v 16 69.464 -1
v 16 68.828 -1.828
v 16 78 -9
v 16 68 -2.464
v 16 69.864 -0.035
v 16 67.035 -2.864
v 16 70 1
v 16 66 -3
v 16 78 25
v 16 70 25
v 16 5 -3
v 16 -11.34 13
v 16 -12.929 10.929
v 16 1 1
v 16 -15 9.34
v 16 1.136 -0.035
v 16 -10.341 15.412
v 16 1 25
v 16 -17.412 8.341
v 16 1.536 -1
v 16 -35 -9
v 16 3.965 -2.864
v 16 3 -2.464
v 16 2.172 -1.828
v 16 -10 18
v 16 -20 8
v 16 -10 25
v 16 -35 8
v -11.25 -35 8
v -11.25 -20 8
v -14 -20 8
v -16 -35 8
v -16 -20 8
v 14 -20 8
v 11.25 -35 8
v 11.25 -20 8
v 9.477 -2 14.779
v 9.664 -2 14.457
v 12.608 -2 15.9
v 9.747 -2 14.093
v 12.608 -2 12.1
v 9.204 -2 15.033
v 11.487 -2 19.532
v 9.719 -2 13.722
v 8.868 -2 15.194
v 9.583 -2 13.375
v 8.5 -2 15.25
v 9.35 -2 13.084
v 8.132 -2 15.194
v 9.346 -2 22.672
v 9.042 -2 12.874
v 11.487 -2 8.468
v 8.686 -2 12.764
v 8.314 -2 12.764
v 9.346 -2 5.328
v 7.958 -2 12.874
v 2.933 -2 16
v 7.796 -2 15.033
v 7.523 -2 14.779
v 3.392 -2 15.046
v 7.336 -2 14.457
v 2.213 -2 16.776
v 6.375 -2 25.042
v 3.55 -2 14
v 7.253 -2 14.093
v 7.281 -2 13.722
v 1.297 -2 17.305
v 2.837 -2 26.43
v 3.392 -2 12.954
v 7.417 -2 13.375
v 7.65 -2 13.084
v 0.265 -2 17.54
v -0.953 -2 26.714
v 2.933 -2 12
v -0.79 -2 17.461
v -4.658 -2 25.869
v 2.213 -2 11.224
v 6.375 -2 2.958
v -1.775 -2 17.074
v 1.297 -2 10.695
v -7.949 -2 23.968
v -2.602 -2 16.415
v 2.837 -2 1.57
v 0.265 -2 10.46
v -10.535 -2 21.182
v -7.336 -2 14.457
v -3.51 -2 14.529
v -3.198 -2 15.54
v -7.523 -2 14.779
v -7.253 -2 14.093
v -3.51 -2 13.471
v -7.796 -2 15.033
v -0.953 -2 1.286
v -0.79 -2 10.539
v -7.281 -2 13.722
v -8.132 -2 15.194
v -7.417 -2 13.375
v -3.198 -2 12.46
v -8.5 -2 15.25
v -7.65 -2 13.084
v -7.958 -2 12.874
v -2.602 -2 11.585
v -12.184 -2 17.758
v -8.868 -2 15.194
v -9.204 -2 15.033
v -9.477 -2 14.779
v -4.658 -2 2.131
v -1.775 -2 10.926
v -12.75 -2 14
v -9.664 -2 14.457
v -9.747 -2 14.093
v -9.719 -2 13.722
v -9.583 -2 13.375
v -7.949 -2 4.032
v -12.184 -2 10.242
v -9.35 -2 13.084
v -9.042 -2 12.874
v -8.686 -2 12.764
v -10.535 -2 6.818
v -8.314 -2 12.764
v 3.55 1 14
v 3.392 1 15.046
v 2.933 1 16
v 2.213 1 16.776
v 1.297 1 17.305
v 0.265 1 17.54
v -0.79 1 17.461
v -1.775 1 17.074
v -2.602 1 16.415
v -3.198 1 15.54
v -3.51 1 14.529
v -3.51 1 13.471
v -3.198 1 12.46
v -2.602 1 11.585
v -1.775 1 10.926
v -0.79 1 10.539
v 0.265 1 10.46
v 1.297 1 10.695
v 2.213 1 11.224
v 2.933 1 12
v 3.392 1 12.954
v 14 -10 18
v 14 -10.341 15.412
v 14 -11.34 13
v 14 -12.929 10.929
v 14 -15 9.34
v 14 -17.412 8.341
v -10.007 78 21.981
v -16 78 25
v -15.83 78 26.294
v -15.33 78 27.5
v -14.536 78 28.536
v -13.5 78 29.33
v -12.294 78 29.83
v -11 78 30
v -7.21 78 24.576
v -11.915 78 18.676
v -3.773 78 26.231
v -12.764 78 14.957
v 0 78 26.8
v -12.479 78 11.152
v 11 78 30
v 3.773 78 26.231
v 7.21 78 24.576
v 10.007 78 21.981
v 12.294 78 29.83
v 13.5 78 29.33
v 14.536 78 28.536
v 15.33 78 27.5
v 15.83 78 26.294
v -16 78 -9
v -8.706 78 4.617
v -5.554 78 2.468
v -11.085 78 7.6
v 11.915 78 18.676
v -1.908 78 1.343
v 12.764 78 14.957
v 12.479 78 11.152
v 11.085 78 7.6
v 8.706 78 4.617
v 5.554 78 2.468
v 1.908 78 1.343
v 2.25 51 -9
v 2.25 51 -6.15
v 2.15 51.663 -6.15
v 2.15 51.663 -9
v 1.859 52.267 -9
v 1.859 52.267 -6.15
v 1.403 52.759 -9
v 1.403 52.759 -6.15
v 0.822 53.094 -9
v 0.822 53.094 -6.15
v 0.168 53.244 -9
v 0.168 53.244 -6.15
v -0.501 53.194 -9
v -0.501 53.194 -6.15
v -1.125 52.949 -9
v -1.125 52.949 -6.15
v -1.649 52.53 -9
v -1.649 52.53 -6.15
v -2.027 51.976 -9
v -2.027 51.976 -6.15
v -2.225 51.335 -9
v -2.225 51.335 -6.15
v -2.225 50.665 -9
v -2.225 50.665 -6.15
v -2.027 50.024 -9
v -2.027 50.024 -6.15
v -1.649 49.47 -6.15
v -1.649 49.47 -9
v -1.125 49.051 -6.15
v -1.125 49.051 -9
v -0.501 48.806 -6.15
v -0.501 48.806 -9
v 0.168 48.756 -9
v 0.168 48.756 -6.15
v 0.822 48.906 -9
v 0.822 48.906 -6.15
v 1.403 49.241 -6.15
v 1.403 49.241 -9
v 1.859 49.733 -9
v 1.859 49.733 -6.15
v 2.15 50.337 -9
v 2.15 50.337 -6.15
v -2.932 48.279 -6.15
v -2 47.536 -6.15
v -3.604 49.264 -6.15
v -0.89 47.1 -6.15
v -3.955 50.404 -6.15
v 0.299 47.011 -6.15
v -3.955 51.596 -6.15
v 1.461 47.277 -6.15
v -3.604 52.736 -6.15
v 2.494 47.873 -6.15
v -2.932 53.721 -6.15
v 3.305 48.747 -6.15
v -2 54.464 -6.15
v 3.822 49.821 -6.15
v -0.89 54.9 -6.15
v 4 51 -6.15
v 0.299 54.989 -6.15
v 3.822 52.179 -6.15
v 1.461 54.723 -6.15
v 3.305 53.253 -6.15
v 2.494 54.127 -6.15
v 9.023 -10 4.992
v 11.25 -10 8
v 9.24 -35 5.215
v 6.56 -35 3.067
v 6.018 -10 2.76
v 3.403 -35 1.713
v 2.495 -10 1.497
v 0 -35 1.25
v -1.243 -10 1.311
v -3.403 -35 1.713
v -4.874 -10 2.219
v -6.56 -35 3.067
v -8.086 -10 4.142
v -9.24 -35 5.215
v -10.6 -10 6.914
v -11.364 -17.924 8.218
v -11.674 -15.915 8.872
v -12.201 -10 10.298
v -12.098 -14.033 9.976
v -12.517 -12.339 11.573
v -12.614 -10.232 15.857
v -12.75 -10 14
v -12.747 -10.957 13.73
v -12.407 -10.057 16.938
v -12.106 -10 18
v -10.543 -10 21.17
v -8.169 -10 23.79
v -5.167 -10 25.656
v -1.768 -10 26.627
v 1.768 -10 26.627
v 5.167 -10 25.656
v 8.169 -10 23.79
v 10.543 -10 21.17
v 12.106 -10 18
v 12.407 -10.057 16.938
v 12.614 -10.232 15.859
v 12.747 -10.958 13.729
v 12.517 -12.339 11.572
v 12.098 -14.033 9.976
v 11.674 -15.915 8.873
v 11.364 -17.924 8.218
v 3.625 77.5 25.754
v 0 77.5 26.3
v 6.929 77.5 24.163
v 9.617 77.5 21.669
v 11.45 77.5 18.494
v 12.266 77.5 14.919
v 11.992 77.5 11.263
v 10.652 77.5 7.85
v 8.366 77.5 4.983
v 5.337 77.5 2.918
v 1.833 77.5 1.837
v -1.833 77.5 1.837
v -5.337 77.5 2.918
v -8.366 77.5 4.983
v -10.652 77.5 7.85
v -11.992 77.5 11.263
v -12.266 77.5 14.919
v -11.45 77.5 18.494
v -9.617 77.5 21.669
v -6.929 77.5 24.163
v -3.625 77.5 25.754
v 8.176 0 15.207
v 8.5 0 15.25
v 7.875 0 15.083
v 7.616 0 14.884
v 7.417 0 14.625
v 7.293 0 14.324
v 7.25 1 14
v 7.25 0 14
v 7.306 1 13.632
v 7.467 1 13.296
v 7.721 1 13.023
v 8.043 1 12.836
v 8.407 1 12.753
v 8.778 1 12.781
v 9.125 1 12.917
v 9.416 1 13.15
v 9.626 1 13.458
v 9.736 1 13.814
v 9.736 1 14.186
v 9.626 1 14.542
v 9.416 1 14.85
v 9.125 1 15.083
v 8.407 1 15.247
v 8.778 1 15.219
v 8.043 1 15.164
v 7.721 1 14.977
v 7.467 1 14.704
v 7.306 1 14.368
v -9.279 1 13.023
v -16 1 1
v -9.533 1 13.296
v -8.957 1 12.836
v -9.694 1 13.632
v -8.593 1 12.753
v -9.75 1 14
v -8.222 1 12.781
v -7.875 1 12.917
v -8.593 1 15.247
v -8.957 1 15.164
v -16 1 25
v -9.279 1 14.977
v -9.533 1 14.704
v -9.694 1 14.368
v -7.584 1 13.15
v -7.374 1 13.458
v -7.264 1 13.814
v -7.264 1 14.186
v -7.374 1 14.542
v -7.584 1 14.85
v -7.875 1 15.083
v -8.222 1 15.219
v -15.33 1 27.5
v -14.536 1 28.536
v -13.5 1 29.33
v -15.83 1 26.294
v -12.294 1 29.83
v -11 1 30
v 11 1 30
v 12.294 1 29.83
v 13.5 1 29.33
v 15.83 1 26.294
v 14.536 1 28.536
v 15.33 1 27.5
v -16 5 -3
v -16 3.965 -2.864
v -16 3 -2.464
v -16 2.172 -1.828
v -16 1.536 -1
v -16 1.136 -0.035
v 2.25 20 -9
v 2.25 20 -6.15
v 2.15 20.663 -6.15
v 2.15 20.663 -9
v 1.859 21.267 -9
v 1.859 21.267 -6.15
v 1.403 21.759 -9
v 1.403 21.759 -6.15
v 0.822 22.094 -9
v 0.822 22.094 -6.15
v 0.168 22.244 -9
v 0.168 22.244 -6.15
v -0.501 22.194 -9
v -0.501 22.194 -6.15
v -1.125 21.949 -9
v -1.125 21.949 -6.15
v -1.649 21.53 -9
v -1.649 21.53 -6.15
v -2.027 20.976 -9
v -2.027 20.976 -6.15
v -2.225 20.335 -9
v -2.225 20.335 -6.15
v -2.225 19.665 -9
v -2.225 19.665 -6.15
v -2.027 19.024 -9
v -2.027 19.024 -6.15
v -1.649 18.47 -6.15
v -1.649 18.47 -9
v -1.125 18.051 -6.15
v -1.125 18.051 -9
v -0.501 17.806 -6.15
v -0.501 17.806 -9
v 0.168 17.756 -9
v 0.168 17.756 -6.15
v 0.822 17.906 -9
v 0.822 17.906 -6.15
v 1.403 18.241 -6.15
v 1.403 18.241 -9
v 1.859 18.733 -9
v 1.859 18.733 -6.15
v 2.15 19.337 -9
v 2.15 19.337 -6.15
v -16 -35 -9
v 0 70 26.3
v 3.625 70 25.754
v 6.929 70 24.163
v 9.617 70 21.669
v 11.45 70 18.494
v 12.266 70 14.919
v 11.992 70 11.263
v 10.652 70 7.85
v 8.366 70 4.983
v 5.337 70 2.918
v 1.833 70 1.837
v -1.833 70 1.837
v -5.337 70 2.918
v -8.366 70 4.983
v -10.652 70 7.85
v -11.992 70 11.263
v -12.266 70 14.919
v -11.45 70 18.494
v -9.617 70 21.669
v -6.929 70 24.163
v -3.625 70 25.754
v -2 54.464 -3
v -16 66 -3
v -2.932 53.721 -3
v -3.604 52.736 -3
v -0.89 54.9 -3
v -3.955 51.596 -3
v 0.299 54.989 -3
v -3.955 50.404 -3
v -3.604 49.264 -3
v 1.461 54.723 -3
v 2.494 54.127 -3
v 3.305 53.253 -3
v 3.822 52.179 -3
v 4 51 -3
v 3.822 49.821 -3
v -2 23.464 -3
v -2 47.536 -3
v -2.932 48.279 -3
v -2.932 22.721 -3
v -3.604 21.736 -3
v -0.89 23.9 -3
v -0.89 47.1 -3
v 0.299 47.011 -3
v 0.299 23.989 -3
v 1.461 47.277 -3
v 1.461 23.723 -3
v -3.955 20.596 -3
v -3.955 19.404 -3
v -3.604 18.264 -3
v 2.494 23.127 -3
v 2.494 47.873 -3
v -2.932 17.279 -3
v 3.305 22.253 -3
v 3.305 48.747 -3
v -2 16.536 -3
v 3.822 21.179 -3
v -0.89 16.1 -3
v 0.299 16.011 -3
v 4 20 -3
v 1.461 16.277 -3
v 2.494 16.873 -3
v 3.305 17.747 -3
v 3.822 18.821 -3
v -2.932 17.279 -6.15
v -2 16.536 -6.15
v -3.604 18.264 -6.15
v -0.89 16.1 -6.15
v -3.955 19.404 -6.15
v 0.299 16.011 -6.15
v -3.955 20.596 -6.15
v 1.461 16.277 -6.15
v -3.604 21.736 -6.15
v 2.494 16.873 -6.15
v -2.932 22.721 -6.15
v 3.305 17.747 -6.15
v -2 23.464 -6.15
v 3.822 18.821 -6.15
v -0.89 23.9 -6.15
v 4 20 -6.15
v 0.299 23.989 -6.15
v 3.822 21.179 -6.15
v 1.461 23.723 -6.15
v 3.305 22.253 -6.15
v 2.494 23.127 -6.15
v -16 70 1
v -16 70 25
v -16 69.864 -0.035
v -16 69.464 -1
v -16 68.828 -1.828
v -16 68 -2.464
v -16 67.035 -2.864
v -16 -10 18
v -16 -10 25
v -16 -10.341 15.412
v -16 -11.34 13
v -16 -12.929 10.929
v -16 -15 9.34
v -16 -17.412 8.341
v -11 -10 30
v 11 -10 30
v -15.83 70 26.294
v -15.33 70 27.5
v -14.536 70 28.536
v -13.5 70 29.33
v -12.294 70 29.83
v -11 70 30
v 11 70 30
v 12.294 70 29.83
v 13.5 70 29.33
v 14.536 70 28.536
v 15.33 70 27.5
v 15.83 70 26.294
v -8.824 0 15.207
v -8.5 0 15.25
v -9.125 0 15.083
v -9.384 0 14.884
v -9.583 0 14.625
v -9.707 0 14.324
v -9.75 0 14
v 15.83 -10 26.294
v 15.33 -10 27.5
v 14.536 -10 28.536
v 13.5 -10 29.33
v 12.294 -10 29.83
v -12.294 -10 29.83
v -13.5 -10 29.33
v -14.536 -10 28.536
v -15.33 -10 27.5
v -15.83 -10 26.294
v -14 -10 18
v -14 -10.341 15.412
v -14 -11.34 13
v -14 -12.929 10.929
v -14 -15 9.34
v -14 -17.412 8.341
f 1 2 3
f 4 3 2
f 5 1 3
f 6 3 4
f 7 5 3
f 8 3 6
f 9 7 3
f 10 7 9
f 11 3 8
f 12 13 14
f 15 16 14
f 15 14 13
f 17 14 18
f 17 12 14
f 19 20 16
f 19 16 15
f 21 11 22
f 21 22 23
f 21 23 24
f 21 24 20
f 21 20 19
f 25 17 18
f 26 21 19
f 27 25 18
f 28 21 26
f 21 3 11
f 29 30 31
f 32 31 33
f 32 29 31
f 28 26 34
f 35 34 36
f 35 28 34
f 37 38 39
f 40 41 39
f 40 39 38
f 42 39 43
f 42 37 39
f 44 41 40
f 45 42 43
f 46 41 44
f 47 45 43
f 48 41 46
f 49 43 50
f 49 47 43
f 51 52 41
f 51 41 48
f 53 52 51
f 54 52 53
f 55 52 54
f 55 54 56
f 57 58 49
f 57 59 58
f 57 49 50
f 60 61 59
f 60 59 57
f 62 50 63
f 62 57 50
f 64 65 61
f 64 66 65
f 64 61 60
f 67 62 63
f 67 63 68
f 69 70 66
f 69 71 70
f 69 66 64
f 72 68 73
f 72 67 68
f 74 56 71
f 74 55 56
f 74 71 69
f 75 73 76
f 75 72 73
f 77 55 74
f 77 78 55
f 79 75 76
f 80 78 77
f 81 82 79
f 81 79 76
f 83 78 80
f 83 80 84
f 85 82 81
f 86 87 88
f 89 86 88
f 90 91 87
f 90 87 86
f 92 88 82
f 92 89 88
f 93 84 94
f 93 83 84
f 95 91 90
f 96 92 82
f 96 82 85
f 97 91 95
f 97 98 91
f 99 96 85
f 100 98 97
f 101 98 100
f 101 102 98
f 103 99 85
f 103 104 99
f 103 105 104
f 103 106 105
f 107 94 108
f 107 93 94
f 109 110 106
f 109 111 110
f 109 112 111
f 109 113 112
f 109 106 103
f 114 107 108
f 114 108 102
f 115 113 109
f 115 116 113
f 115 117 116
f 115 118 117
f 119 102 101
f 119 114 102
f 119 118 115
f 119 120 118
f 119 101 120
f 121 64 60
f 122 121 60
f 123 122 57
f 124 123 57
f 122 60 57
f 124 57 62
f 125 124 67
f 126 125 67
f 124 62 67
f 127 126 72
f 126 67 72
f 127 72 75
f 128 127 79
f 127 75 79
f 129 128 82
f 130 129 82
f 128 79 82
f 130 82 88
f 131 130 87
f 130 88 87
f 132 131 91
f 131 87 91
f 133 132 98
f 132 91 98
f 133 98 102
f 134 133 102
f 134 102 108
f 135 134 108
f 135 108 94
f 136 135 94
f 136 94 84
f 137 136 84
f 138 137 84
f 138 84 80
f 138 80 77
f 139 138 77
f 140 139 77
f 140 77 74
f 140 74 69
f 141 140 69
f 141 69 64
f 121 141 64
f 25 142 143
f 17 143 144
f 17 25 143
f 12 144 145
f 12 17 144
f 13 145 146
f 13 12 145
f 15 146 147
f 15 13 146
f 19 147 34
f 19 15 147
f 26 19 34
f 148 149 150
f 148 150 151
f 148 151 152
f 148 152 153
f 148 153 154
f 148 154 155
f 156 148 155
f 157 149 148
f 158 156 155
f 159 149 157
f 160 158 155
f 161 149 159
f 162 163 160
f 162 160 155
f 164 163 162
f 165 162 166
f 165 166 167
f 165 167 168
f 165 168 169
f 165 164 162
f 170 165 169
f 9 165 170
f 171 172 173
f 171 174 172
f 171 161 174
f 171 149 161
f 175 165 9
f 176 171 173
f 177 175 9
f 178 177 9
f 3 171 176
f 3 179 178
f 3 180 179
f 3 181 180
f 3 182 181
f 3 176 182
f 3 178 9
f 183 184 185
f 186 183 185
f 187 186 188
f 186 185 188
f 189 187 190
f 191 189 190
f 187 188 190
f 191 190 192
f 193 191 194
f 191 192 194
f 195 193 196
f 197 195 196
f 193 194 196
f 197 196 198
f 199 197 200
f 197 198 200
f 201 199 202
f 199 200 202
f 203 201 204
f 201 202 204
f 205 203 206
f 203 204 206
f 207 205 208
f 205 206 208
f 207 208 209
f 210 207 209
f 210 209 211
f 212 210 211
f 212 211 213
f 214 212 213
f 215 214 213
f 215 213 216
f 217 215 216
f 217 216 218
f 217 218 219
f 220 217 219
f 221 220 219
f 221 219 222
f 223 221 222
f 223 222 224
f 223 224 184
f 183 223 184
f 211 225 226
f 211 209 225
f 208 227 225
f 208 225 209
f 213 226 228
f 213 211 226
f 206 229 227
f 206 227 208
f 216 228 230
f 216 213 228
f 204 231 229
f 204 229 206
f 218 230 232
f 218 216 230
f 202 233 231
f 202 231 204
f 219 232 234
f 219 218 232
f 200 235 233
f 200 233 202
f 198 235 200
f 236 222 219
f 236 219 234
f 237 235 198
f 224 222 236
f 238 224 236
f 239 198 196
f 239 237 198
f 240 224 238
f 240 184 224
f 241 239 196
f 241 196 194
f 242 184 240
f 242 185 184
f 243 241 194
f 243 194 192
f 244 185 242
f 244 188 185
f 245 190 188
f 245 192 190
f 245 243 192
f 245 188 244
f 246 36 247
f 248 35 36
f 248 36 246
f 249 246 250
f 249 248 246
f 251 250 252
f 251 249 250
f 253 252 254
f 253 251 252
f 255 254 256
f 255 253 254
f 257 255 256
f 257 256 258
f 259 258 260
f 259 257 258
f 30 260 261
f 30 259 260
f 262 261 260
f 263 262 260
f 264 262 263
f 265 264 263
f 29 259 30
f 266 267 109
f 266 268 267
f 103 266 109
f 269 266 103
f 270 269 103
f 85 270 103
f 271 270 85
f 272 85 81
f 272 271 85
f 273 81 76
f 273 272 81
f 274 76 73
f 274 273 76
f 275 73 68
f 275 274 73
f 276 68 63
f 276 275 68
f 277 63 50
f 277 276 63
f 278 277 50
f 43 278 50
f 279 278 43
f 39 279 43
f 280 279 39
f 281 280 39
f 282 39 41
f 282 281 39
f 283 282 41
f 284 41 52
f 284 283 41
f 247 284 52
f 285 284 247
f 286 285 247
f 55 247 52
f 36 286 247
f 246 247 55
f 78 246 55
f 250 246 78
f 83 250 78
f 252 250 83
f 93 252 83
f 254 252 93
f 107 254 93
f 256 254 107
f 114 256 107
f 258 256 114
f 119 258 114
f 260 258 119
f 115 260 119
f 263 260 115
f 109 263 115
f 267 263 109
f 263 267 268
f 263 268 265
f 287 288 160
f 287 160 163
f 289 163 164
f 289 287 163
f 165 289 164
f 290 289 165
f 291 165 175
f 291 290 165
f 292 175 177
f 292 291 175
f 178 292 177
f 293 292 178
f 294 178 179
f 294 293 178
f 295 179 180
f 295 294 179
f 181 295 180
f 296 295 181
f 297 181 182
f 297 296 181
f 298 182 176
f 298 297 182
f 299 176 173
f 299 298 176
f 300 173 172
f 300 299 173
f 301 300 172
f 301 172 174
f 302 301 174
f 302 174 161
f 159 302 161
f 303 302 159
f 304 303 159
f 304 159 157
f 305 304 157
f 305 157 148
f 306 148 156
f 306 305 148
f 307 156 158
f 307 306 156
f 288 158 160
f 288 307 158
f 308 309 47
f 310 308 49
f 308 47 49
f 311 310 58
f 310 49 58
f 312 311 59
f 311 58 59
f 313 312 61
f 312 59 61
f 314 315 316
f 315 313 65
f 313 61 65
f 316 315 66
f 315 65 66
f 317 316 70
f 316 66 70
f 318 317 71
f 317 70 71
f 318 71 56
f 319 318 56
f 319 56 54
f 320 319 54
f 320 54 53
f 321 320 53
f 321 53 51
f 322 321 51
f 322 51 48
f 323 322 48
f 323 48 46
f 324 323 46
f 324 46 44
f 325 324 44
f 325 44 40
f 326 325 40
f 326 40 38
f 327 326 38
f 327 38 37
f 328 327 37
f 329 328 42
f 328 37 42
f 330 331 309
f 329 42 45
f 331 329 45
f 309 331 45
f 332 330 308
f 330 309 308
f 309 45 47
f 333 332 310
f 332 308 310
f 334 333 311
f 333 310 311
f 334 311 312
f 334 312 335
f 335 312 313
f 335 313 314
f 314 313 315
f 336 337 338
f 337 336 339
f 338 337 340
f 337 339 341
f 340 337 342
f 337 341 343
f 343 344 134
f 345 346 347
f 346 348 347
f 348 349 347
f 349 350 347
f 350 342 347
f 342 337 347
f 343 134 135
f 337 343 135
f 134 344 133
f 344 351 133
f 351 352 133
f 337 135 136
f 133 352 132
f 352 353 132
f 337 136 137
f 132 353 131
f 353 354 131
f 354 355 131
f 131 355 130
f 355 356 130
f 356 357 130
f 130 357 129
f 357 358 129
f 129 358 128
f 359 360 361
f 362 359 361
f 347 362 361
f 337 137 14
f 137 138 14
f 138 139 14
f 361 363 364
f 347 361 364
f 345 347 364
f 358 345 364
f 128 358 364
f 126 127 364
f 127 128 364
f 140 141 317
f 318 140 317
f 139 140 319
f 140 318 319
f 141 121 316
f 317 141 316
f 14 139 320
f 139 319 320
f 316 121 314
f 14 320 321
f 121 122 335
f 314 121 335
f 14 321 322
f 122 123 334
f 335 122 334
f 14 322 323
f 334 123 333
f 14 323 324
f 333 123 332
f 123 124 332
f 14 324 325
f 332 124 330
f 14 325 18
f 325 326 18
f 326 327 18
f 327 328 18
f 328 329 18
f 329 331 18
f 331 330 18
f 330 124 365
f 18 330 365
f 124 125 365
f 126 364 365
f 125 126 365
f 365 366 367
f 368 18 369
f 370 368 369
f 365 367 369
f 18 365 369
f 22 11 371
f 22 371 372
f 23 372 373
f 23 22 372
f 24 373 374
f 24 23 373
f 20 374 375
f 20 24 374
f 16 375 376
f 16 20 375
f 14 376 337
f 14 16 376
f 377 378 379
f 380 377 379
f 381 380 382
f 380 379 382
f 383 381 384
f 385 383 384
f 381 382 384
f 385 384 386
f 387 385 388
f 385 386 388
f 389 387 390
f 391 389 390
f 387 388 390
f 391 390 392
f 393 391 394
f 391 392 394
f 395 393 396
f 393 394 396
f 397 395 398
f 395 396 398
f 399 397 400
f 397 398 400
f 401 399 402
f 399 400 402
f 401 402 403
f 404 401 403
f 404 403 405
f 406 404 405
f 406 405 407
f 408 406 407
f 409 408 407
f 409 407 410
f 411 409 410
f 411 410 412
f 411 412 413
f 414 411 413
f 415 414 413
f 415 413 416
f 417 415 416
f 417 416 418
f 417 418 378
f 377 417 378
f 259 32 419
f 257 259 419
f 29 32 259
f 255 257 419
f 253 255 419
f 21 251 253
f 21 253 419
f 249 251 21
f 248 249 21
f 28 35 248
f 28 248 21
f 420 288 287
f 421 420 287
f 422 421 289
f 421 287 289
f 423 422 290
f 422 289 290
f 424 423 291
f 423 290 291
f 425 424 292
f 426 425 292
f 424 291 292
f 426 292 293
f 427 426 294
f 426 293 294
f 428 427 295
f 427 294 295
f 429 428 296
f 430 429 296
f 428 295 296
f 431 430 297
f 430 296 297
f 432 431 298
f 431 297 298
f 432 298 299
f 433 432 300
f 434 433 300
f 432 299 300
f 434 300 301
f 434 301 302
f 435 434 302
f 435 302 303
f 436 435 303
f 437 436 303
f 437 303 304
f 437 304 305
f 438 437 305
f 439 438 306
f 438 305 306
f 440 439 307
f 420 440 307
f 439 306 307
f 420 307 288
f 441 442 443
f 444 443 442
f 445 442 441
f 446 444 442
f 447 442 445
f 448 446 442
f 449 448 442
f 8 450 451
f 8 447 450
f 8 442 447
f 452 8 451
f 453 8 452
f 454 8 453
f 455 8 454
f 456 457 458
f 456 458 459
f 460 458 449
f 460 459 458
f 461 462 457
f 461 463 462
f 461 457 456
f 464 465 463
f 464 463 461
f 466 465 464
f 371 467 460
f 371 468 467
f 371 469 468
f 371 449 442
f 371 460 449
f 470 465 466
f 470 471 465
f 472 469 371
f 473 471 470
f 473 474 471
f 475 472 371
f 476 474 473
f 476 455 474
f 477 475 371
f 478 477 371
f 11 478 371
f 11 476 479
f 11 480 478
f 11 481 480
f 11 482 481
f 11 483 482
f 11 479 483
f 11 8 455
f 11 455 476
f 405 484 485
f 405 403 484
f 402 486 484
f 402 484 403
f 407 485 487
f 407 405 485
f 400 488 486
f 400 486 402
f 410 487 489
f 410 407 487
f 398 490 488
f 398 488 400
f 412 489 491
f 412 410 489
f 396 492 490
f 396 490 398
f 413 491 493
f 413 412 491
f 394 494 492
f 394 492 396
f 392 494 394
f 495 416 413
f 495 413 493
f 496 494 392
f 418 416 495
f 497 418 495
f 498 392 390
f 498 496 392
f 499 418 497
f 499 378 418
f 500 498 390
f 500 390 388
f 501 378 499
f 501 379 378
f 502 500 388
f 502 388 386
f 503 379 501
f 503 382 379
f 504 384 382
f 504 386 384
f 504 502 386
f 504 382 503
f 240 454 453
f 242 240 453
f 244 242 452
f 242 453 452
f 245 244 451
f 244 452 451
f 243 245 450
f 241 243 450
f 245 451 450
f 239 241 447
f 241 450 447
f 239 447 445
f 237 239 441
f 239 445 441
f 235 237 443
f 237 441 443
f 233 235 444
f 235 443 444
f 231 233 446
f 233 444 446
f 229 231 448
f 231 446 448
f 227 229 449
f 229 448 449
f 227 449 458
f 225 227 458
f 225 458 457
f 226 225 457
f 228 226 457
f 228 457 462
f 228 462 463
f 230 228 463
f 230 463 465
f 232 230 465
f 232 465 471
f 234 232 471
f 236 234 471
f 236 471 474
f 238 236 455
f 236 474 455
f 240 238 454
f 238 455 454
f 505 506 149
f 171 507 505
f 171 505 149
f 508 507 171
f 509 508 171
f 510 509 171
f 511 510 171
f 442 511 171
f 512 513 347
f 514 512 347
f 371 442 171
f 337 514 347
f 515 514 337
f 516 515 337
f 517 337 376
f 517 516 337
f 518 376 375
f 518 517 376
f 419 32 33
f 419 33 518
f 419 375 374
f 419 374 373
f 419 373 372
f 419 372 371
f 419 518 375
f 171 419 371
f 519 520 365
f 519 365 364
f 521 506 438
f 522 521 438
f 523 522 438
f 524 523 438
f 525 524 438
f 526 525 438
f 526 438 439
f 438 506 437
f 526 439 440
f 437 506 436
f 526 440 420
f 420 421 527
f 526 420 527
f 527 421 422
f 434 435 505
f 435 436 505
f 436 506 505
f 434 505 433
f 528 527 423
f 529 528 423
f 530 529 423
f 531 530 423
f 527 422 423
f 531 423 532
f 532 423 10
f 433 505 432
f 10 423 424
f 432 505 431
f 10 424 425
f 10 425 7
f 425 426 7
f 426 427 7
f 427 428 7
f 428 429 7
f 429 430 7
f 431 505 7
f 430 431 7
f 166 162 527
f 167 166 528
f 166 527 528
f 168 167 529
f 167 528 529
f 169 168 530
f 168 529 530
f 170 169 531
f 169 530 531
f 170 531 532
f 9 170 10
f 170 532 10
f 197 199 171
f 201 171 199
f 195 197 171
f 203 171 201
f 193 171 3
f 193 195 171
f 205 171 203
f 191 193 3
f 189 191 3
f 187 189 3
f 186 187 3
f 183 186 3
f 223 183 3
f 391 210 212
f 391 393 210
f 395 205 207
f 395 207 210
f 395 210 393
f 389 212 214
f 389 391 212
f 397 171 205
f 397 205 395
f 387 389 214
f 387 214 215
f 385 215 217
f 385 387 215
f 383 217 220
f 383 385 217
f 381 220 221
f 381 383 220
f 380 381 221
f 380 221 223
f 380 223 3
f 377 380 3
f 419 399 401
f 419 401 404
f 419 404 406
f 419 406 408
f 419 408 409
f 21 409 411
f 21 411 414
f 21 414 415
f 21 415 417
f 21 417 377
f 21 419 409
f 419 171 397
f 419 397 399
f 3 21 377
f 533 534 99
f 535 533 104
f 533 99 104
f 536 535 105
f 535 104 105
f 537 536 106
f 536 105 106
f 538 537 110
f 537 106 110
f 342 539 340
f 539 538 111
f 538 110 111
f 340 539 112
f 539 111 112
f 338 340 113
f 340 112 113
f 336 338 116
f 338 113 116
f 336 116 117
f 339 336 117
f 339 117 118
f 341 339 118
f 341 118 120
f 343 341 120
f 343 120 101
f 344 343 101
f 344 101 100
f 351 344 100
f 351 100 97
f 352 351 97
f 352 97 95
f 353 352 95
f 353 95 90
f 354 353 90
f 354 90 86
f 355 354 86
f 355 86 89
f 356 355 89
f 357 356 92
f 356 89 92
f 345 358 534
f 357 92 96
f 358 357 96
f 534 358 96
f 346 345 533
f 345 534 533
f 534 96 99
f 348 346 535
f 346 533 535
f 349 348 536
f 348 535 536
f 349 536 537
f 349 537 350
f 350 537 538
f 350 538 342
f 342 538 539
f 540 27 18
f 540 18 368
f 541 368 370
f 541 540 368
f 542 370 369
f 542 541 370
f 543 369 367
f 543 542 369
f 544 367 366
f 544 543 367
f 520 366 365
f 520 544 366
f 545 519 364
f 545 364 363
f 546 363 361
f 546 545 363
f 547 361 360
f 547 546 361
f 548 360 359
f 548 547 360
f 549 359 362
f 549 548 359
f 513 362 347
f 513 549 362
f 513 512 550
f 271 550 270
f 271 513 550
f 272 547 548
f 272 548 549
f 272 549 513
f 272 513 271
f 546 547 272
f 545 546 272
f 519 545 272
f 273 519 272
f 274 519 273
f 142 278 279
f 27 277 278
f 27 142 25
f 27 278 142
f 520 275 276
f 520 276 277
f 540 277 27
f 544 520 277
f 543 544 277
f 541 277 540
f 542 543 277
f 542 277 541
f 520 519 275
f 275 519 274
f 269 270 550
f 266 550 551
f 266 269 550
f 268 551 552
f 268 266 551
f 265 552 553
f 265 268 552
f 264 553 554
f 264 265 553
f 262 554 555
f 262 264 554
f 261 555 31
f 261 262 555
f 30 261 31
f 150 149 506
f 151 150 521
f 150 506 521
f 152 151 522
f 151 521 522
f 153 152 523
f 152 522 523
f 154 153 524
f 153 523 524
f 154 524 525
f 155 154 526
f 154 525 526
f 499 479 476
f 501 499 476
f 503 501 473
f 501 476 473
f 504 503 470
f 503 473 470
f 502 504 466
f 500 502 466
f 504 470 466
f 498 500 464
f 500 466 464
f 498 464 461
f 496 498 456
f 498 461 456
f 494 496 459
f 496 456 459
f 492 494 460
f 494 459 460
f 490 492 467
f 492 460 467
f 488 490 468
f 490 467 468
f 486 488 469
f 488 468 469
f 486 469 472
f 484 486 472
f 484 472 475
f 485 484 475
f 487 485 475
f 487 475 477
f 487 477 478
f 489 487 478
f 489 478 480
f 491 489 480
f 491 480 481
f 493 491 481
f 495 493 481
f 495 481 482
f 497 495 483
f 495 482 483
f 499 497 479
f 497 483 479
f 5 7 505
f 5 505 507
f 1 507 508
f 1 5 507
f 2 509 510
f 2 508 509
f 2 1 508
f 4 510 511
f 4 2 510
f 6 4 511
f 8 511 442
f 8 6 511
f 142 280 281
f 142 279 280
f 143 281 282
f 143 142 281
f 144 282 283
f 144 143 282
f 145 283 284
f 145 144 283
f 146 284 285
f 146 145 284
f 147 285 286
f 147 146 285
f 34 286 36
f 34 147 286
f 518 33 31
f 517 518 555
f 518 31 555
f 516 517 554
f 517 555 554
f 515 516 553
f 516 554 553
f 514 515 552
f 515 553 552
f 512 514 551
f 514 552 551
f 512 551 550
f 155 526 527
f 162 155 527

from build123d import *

# Parameters (mm, degrees)
CROQUIS1_W                          = 31
CROQUIS1_H                          = 72
SALIENTE_EXTRUIR1_DEPTH             = 28
CROQUIS2_W                          = 27
CROQUIS2_H                          = 69
CORTAR_EXTRUIR1_DEPTH               = 83.170554337
CROQUIS5_W                          = 13
CROQUIS5_H                          = 10
DI_METRO_DE_TALADRO_2_5_2_5_2_D     = 2.5
DI_METRO_DE_TALADRO_2_5_2_5_2_DEPTH = 11
REDONDEO3_R                         = 5
REDONDEO4_R                         = 3
SALIENTE_EXTRUIR2_START             = 10
CROQUIS14_R                         = 13
SALIENTE_EXTRUIR2_DEPTH             = 10
CROQUIS15_W                         = 28
CROQUIS15_H                         = 82
SALIENTE_EXTRUIR3_DEPTH             = 6
CORTAR_EXTRUIR2_REACH               = 80.511
CROQUIS16_R                         = 3.55
CROQUIS17_R                         = 3.55
SALIENTE_EXTRUIR4_DEPTH             = 6
CORTAR_EXTRUIR3_DEPTH               = 88.475710915
SALIENTE_EXTRUIR5_START             = 10
SALIENTE_EXTRUIR5_DEPTH             = 10
REDONDEO5_R                         = 10
CROQUIS20_R                         = 2.25
CORTAR_EXTRUIR4_DEPTH               = 86.094065614
CROQUIS21_R                         = 4
CROQUIS21_R_2                       = 2.25
CORTAR_EXTRUIR5_DEPTH               = 3.15
SALIENTE_EXTRUIR6_START             = 2
CROQUIS22_R                         = 12.75
CROQUIS22_R_2                       = 1.25
CROQUIS22_R_3                       = 3.55
SALIENTE_EXTRUIR6_DEPTH             = 2
SALIENTE_EXTRUIR7_START             = -8
SALIENTE_EXTRUIR7_DEPTH             = 8
SALIENTE_EXTRUIR8_DEPTH             = 2
SALIENTE_EXTRUIR9_START             = 2
SALIENTE_EXTRUIR9_DEPTH             = 2
SALIENTE_EXTRUIR10_DEPTH            = 11
CROQUIS27_R                         = 12.3
CORTAR_EXTRUIR6_DEPTH               = 8
SALIENTE_EXTRUIR11_START            = 15
SALIENTE_EXTRUIR11_DEPTH            = 15
CHAFL_N1_SIZE                       = 0.5


with BuildPart() as part:
    # Croquis1 → Saliente-Extruir1 (new body)
    with BuildSketch(Plane(origin=(14, 0, 0), x_dir=(0, 0, -1), z_dir=(1, 0, 0))):
        with Locations((-12.5, 36)):
            Rectangle(CROQUIS1_W, CROQUIS1_H)
    extrude(amount=-SALIENTE_EXTRUIR1_DEPTH)

    # Croquis2 → Cortar-Extruir1 (cut, through all)
    with BuildSketch(Plane.ZY.offset(14)):
        with Locations((14.5, 35.5)):
            Rectangle(CROQUIS2_W, CROQUIS2_H)
    extrude(amount=-CORTAR_EXTRUIR1_DEPTH, mode=Mode.SUBTRACT)

    # Croquis5 → Revolución3 (revolve)
    with BuildSketch(Plane(origin=(0, 0, 14), x_dir=(-1, 0, 0), z_dir=(0, 0, -1)), mode=Mode.PRIVATE) as revoluci_n3_sk:
        with Locations((-6.5, -5)):
            Rectangle(CROQUIS5_W, CROQUIS5_H)
    revolve(revoluci_n3_sk.sketch.rotate(Axis((0, -10, 14), (0, 1, 0)), 180), axis=Axis((0, -10, 14), (0, 1, 0)))

    # Croquis6 → Cortar-Revolución1 (revolve, cut)
    with BuildSketch(Plane(origin=(0, 0, 14), x_dir=(-1, 0, 0), z_dir=(0, 0, -1)), mode=Mode.PRIVATE) as cortar_revoluci_n1_sk:
        Polygon((-12.75, -10), (0, -10), (0, 2), (-2.3, 2), (-2.3, 1), (-2.25, 1), (-2.25, 0), (-12.75, 0), align=None)
    revolve(cortar_revoluci_n1_sk.sketch.rotate(Axis((0, -10, 14), (0, 1, 0)), 180), axis=Axis((0, -10, 14), (0, 1, 0)), mode=Mode.SUBTRACT)

    # Diámetro de taladro Ø2.5 (2.5)2
    with Locations(Plane(origin=(0, 1, 0), x_dir=(1, 0, 0), z_dir=(0, 1, 0))):
        with Locations((8.5, -14), (-8.5, -14)):
            Hole(DI_METRO_DE_TALADRO_2_5_2_5_2_D / 2, depth=DI_METRO_DE_TALADRO_2_5_2_5_2_DEPTH)

    # Redondeo3
    redondeo3_edges = [part.edges().sort_by_distance(p)[0] for p in [
        (0, 1, 1),
        (0, 70, 1),
    ]]
    fillet(redondeo3_edges, radius=REDONDEO3_R)

    # Redondeo4
    redondeo4_edges = [part.edges().sort_by_distance(p)[0] for p in [
        (14, 0.5, 28),
        (-14, 0.5, 28),
        (14, 71, 28),
        (-14, 71, 28),
    ]]
    fillet(redondeo4_edges, radius=REDONDEO4_R)

    # Croquis14 → Saliente-Extruir2 (add)
    with BuildSketch(Plane.XZ.offset(SALIENTE_EXTRUIR2_START)):
        with BuildLine():
            Line((11, 28), (-11, 28))
            ThreePointArc((-11, 28), (-13.121320344, 27.121320344), (-14, 25))
            Line((-14, 25), (-14, -3))
            Line((-14, -3), (14, -3))
            Line((14, -3), (14, 25))
            ThreePointArc((14, 25), (13.121320344, 27.121320344), (11, 28))
        make_face()
        with Locations((0, 14)):
            Circle(CROQUIS14_R, mode=Mode.SUBTRACT)
    extrude(amount=-SALIENTE_EXTRUIR2_DEPTH)

    # Croquis15 → Saliente-Extruir3 (add)
    with BuildSketch(Plane(origin=(0, 0, -3), x_dir=(-1, 0, 0), z_dir=(0, 0, -1))):
        with Locations((0, 31)):
            Rectangle(CROQUIS15_W, CROQUIS15_H)
    extrude(amount=SALIENTE_EXTRUIR3_DEPTH)

    # Cortar-Extruir2: up to this face of the body (flat: up to its plane)
    cortar_extruir2_end = Plane(part.part.faces().sort_by_distance((0, 72, 9.433270582))[0])
    # Croquis16 → Cortar-Extruir2 (cut, up to the picked face)
    with BuildSketch(Plane.XZ, mode=Mode.PRIVATE) as cortar_extruir2_sk1:
        with Locations((0, 14)):
            Circle(CROQUIS16_R)
    cortar_extruir2_tool1 = split(extrude(cortar_extruir2_sk1.sketch, amount=-CORTAR_EXTRUIR2_REACH, mode=Mode.PRIVATE), bisect_by=cortar_extruir2_end, keep=Keep.BOTH, mode=Mode.PRIVATE)
    add(cortar_extruir2_tool1.solids().sort_by(Axis((0, 0, 14), (0, 1, 0)))[0], mode=Mode.SUBTRACT)

    # Croquis17 → Saliente-Extruir4 (add)
    with BuildSketch(Plane(origin=(0, 72, 0), x_dir=(1, 0, 0), z_dir=(0, 1, 0))):
        with BuildLine():
            Line((-11, -28), (11, -28))
            ThreePointArc((11, -28), (13.121320344, -27.121320344), (14, -25))
            Line((14, -25), (14, 9))
            Line((14, 9), (-14, 9))
            Line((-14, 9), (-14, -25))
            ThreePointArc((-14, -25), (-13.121320344, -27.121320344), (-11, -28))
        make_face()
        with Locations((0, -14)):
            Circle(CROQUIS17_R, mode=Mode.SUBTRACT)
    extrude(amount=SALIENTE_EXTRUIR4_DEPTH)

    # Croquis18 → Cortar-Extruir3 (cut, through all)
    with BuildSketch(Plane.ZY.offset(14)):
        with BuildLine():
            Line((6, 70), (1, 70))
            ThreePointArc((1, 70), (-1.828427125, 68.828427125), (-3, 66))
            Line((-3, 66), (-3, 5))
            ThreePointArc((-3, 5), (-1.828427125, 2.171572875), (1, 1))
            Line((1, 1), (6, 1))
            ThreePointArc((6, 1), (2.464466094, 2.464466094), (1, 6))
            Line((1, 6), (1, 65))
            ThreePointArc((1, 65), (2.464466094, 68.535533906), (6, 70))
        make_face()
    extrude(amount=-CORTAR_EXTRUIR3_DEPTH, mode=Mode.SUBTRACT)

    # Croquis19 → Saliente-Extruir5 (add)
    with BuildSketch(Plane.XZ.offset(10).offset(SALIENTE_EXTRUIR5_START)):
        with BuildLine():
            Line((-11.25, 8), (-14, 8))
            Line((-14, 8), (-14, -9))
            Line((-14, -9), (14, -9))
            Line((14, -9), (14, 8))
            Line((14, 8), (11.25, 8))
            ThreePointArc((11.25, 8), (0, 1.25), (-11.25, 8))
        make_face()
    extrude(amount=-SALIENTE_EXTRUIR5_DEPTH)

    # Redondeo5
    # the kernel refuses this fillet: 10 mm, written as the material it adds along each edge
    with BuildSketch(Plane(origin=(14, -10, 8), x_dir=(0, -1, 0), z_dir=(-1, 0, 0))) as redondeo5_piece_1_section:
        with BuildLine():
            CenterArc((REDONDEO5_R, REDONDEO5_R), REDONDEO5_R, 180, 90)
            Line((0, REDONDEO5_R), (0, 0))
            Line((0, 0), (REDONDEO5_R, 0))
        make_face()
    redondeo5_piece_1 = extrude(amount=27.75, mode=Mode.PRIVATE)
    redondeo5_piece_1 = redondeo5_piece_1 - Plane(origin=(0, -12.512239399, 14), x_dir=(-1, 0, 0), z_dir=(0, -1, 0)) * Cylinder(12.75, 96, mode=Mode.PRIVATE)
    add(redondeo5_piece_1)
    with BuildSketch(Plane(origin=(13.75, -10, 8), x_dir=(0, -1, 0), z_dir=(-1, 0, 0))) as redondeo5_piece_2_section:
        with BuildLine():
            CenterArc((REDONDEO5_R, REDONDEO5_R), REDONDEO5_R, 180, 90)
            Line((0, REDONDEO5_R), (0, 0))
            Line((0, 0), (REDONDEO5_R, 0))
        make_face()
    redondeo5_piece_2 = extrude(amount=27.75, mode=Mode.PRIVATE)
    redondeo5_piece_2 = redondeo5_piece_2 - Plane(origin=(0, -12.552647231, 14), x_dir=(-1, 0, 0), z_dir=(0, -1, 0)) * Cylinder(12.75, 96, mode=Mode.PRIVATE)
    add(redondeo5_piece_2)

    # Croquis20 → Cortar-Extruir4 (cut, through all)
    with BuildSketch(Plane.XY.offset(-3)):
        with Locations((0, 51)):
            Circle(CROQUIS20_R)
        with Locations((0, 20)):
            Circle(CROQUIS20_R)
    extrude(amount=-CORTAR_EXTRUIR4_DEPTH, mode=Mode.SUBTRACT)

    # Croquis21 → Cortar-Extruir5 (cut)
    # profile 1 of 2: a face of its own
    with BuildSketch(Plane.XY.offset(-3)):
        with Locations((0, 51)):
            Circle(CROQUIS21_R)
        with Locations((0, 51)):
            Circle(CROQUIS21_R_2, mode=Mode.SUBTRACT)
    # profile 2 of 2: a face of its own
    with BuildSketch(Plane.XY.offset(-3)):
        with Locations((0, 20)):
            Circle(CROQUIS21_R)
        with Locations((0, 20)):
            Circle(CROQUIS21_R_2, mode=Mode.SUBTRACT)
    extrude(amount=-CORTAR_EXTRUIR5_DEPTH, mode=Mode.SUBTRACT)

    # Croquis22 → Saliente-Extruir6 (add)
    with BuildSketch(Plane.XZ.offset(SALIENTE_EXTRUIR6_START)):
        with Locations(Location((0, 14, 0), (0, 0, 161.71611006))):
            Circle(CROQUIS22_R)
        with Locations(Location((8.5, 14, 0), (0, 0, 90))):
            Circle(CROQUIS22_R_2, mode=Mode.SUBTRACT)
        with Locations((0, 14)):
            Circle(CROQUIS22_R_3, mode=Mode.SUBTRACT)
        with Locations(Location((-8.5, 14, 0), (0, 0, 90))):
            Circle(CROQUIS22_R_2, mode=Mode.SUBTRACT)
    extrude(amount=-SALIENTE_EXTRUIR6_DEPTH)

    # Croquis23 → Saliente-Extruir7 (add)
    with BuildSketch(Plane(origin=(0, 78, 0), x_dir=(1, 0, 0), z_dir=(0, 1, 0)).offset(SALIENTE_EXTRUIR7_START)):
        with BuildLine():
            Line((-11, -30), (11, -30))
            ThreePointArc((11, -30), (14.535533906, -28.535533906), (16, -25))
            Line((16, -25), (16, 9))
            Line((16, 9), (14, 9))
            Line((14, 9), (14, -25))
            ThreePointArc((14, -25), (13.121320344, -27.121320344), (11, -28))
            Line((11, -28), (-11, -28))
            ThreePointArc((-11, -28), (-13.121320344, -27.121320344), (-14, -25))
            Line((-14, -25), (-14, 9))
            Line((-14, 9), (-16, 9))
            Line((-16, 9), (-16, -25))
            ThreePointArc((-16, -25), (-14.535533906, -28.535533906), (-11, -30))
        make_face()
    extrude(amount=SALIENTE_EXTRUIR7_DEPTH)

    # Croquis24 → Saliente-Extruir8 (add)
    with BuildSketch(Plane.ZY.offset(14)):
        with BuildLine():
            Line((1, 70), (-9, 70))
            Line((-9, 70), (-9, -20))
            Line((-9, -20), (8, -20))
            ThreePointArc((8, -20), (10.928932188, -12.928932188), (18, -10))
            Line((18, -10), (25, -10))
            Line((25, -10), (25, 1))
            Line((25, 1), (1, 1))
            ThreePointArc((1, 1), (-1.828427125, 2.171572875), (-3, 5))
            Line((-3, 5), (-3, 66))
            ThreePointArc((-3, 66), (-1.828427125, 68.828427125), (1, 70))
        make_face()
    extrude(amount=SALIENTE_EXTRUIR8_DEPTH)

    # Croquis25 → Saliente-Extruir9 (add)
    with BuildSketch(Plane(origin=(14, 0, 0), x_dir=(0, 0, -1), z_dir=(1, 0, 0)).offset(SALIENTE_EXTRUIR9_START)):
        with BuildLine():
            Line((9, -20), (9, 70))
            Line((9, 70), (-1, 70))
            ThreePointArc((-1, 70), (1.828427125, 68.828427125), (3, 66))
            Line((3, 66), (3, 5))
            ThreePointArc((3, 5), (1.828427125, 2.171572875), (-1, 1))
            Line((-1, 1), (-25, 1))
            Line((-25, 1), (-25, -10))
            Line((-25, -10), (-18, -10))
            ThreePointArc((-18, -10), (-10.928932188, -12.928932188), (-8, -20))
            Line((-8, -20), (9, -20))
        make_face()
    extrude(amount=-SALIENTE_EXTRUIR9_DEPTH)

    # Croquis26 → Saliente-Extruir10 (add)
    with BuildSketch(Plane.XZ.offset(10)):
        with BuildLine():
            Line((11, 30), (-11, 30))
            ThreePointArc((-11, 30), (-14.535533906, 28.535533906), (-16, 25))
            Line((-16, 25), (-14, 25))
            ThreePointArc((-14, 25), (-13.121320344, 27.121320344), (-11, 28))
            Line((-11, 28), (11, 28))
            ThreePointArc((11, 28), (13.121320344, 27.121320344), (14, 25))
            Line((14, 25), (16, 25))
            ThreePointArc((16, 25), (14.535533906, 28.535533906), (11, 30))
        make_face()
    extrude(amount=-SALIENTE_EXTRUIR10_DEPTH)

    # Croquis27 → Cortar-Extruir6 (cut)
    with BuildSketch(Plane(origin=(0, 78, 0), x_dir=(1, 0, 0), z_dir=(0, 1, 0))):
        with Locations(Location((0, -14, 0), (0, 0, 270))):
            Circle(CROQUIS27_R)
    extrude(amount=-CORTAR_EXTRUIR6_DEPTH, mode=Mode.SUBTRACT)

    # Croquis28 → Saliente-Extruir11 (add)
    with BuildSketch(Plane.XZ.offset(20).offset(SALIENTE_EXTRUIR11_START)):
        with BuildLine():
            Line((16, 8), (11.25, 8))
            ThreePointArc((11.25, 8), (0, 1.25), (-11.25, 8))
            Line((-11.25, 8), (-16, 8))
            Line((-16, 8), (-16, -9))
            Line((-16, -9), (16, -9))
            Line((16, -9), (16, 8))
        make_face()
    extrude(amount=-SALIENTE_EXTRUIR11_DEPTH)

    # Chaflán1
    chafl_n1_edges = [part.edges().sort_by_distance(p)[0] for p in [
        (0, 78, 1.7),
    ]]
    chamfer(chafl_n1_edges, length=CHAFL_N1_SIZE)


solid = part.part
